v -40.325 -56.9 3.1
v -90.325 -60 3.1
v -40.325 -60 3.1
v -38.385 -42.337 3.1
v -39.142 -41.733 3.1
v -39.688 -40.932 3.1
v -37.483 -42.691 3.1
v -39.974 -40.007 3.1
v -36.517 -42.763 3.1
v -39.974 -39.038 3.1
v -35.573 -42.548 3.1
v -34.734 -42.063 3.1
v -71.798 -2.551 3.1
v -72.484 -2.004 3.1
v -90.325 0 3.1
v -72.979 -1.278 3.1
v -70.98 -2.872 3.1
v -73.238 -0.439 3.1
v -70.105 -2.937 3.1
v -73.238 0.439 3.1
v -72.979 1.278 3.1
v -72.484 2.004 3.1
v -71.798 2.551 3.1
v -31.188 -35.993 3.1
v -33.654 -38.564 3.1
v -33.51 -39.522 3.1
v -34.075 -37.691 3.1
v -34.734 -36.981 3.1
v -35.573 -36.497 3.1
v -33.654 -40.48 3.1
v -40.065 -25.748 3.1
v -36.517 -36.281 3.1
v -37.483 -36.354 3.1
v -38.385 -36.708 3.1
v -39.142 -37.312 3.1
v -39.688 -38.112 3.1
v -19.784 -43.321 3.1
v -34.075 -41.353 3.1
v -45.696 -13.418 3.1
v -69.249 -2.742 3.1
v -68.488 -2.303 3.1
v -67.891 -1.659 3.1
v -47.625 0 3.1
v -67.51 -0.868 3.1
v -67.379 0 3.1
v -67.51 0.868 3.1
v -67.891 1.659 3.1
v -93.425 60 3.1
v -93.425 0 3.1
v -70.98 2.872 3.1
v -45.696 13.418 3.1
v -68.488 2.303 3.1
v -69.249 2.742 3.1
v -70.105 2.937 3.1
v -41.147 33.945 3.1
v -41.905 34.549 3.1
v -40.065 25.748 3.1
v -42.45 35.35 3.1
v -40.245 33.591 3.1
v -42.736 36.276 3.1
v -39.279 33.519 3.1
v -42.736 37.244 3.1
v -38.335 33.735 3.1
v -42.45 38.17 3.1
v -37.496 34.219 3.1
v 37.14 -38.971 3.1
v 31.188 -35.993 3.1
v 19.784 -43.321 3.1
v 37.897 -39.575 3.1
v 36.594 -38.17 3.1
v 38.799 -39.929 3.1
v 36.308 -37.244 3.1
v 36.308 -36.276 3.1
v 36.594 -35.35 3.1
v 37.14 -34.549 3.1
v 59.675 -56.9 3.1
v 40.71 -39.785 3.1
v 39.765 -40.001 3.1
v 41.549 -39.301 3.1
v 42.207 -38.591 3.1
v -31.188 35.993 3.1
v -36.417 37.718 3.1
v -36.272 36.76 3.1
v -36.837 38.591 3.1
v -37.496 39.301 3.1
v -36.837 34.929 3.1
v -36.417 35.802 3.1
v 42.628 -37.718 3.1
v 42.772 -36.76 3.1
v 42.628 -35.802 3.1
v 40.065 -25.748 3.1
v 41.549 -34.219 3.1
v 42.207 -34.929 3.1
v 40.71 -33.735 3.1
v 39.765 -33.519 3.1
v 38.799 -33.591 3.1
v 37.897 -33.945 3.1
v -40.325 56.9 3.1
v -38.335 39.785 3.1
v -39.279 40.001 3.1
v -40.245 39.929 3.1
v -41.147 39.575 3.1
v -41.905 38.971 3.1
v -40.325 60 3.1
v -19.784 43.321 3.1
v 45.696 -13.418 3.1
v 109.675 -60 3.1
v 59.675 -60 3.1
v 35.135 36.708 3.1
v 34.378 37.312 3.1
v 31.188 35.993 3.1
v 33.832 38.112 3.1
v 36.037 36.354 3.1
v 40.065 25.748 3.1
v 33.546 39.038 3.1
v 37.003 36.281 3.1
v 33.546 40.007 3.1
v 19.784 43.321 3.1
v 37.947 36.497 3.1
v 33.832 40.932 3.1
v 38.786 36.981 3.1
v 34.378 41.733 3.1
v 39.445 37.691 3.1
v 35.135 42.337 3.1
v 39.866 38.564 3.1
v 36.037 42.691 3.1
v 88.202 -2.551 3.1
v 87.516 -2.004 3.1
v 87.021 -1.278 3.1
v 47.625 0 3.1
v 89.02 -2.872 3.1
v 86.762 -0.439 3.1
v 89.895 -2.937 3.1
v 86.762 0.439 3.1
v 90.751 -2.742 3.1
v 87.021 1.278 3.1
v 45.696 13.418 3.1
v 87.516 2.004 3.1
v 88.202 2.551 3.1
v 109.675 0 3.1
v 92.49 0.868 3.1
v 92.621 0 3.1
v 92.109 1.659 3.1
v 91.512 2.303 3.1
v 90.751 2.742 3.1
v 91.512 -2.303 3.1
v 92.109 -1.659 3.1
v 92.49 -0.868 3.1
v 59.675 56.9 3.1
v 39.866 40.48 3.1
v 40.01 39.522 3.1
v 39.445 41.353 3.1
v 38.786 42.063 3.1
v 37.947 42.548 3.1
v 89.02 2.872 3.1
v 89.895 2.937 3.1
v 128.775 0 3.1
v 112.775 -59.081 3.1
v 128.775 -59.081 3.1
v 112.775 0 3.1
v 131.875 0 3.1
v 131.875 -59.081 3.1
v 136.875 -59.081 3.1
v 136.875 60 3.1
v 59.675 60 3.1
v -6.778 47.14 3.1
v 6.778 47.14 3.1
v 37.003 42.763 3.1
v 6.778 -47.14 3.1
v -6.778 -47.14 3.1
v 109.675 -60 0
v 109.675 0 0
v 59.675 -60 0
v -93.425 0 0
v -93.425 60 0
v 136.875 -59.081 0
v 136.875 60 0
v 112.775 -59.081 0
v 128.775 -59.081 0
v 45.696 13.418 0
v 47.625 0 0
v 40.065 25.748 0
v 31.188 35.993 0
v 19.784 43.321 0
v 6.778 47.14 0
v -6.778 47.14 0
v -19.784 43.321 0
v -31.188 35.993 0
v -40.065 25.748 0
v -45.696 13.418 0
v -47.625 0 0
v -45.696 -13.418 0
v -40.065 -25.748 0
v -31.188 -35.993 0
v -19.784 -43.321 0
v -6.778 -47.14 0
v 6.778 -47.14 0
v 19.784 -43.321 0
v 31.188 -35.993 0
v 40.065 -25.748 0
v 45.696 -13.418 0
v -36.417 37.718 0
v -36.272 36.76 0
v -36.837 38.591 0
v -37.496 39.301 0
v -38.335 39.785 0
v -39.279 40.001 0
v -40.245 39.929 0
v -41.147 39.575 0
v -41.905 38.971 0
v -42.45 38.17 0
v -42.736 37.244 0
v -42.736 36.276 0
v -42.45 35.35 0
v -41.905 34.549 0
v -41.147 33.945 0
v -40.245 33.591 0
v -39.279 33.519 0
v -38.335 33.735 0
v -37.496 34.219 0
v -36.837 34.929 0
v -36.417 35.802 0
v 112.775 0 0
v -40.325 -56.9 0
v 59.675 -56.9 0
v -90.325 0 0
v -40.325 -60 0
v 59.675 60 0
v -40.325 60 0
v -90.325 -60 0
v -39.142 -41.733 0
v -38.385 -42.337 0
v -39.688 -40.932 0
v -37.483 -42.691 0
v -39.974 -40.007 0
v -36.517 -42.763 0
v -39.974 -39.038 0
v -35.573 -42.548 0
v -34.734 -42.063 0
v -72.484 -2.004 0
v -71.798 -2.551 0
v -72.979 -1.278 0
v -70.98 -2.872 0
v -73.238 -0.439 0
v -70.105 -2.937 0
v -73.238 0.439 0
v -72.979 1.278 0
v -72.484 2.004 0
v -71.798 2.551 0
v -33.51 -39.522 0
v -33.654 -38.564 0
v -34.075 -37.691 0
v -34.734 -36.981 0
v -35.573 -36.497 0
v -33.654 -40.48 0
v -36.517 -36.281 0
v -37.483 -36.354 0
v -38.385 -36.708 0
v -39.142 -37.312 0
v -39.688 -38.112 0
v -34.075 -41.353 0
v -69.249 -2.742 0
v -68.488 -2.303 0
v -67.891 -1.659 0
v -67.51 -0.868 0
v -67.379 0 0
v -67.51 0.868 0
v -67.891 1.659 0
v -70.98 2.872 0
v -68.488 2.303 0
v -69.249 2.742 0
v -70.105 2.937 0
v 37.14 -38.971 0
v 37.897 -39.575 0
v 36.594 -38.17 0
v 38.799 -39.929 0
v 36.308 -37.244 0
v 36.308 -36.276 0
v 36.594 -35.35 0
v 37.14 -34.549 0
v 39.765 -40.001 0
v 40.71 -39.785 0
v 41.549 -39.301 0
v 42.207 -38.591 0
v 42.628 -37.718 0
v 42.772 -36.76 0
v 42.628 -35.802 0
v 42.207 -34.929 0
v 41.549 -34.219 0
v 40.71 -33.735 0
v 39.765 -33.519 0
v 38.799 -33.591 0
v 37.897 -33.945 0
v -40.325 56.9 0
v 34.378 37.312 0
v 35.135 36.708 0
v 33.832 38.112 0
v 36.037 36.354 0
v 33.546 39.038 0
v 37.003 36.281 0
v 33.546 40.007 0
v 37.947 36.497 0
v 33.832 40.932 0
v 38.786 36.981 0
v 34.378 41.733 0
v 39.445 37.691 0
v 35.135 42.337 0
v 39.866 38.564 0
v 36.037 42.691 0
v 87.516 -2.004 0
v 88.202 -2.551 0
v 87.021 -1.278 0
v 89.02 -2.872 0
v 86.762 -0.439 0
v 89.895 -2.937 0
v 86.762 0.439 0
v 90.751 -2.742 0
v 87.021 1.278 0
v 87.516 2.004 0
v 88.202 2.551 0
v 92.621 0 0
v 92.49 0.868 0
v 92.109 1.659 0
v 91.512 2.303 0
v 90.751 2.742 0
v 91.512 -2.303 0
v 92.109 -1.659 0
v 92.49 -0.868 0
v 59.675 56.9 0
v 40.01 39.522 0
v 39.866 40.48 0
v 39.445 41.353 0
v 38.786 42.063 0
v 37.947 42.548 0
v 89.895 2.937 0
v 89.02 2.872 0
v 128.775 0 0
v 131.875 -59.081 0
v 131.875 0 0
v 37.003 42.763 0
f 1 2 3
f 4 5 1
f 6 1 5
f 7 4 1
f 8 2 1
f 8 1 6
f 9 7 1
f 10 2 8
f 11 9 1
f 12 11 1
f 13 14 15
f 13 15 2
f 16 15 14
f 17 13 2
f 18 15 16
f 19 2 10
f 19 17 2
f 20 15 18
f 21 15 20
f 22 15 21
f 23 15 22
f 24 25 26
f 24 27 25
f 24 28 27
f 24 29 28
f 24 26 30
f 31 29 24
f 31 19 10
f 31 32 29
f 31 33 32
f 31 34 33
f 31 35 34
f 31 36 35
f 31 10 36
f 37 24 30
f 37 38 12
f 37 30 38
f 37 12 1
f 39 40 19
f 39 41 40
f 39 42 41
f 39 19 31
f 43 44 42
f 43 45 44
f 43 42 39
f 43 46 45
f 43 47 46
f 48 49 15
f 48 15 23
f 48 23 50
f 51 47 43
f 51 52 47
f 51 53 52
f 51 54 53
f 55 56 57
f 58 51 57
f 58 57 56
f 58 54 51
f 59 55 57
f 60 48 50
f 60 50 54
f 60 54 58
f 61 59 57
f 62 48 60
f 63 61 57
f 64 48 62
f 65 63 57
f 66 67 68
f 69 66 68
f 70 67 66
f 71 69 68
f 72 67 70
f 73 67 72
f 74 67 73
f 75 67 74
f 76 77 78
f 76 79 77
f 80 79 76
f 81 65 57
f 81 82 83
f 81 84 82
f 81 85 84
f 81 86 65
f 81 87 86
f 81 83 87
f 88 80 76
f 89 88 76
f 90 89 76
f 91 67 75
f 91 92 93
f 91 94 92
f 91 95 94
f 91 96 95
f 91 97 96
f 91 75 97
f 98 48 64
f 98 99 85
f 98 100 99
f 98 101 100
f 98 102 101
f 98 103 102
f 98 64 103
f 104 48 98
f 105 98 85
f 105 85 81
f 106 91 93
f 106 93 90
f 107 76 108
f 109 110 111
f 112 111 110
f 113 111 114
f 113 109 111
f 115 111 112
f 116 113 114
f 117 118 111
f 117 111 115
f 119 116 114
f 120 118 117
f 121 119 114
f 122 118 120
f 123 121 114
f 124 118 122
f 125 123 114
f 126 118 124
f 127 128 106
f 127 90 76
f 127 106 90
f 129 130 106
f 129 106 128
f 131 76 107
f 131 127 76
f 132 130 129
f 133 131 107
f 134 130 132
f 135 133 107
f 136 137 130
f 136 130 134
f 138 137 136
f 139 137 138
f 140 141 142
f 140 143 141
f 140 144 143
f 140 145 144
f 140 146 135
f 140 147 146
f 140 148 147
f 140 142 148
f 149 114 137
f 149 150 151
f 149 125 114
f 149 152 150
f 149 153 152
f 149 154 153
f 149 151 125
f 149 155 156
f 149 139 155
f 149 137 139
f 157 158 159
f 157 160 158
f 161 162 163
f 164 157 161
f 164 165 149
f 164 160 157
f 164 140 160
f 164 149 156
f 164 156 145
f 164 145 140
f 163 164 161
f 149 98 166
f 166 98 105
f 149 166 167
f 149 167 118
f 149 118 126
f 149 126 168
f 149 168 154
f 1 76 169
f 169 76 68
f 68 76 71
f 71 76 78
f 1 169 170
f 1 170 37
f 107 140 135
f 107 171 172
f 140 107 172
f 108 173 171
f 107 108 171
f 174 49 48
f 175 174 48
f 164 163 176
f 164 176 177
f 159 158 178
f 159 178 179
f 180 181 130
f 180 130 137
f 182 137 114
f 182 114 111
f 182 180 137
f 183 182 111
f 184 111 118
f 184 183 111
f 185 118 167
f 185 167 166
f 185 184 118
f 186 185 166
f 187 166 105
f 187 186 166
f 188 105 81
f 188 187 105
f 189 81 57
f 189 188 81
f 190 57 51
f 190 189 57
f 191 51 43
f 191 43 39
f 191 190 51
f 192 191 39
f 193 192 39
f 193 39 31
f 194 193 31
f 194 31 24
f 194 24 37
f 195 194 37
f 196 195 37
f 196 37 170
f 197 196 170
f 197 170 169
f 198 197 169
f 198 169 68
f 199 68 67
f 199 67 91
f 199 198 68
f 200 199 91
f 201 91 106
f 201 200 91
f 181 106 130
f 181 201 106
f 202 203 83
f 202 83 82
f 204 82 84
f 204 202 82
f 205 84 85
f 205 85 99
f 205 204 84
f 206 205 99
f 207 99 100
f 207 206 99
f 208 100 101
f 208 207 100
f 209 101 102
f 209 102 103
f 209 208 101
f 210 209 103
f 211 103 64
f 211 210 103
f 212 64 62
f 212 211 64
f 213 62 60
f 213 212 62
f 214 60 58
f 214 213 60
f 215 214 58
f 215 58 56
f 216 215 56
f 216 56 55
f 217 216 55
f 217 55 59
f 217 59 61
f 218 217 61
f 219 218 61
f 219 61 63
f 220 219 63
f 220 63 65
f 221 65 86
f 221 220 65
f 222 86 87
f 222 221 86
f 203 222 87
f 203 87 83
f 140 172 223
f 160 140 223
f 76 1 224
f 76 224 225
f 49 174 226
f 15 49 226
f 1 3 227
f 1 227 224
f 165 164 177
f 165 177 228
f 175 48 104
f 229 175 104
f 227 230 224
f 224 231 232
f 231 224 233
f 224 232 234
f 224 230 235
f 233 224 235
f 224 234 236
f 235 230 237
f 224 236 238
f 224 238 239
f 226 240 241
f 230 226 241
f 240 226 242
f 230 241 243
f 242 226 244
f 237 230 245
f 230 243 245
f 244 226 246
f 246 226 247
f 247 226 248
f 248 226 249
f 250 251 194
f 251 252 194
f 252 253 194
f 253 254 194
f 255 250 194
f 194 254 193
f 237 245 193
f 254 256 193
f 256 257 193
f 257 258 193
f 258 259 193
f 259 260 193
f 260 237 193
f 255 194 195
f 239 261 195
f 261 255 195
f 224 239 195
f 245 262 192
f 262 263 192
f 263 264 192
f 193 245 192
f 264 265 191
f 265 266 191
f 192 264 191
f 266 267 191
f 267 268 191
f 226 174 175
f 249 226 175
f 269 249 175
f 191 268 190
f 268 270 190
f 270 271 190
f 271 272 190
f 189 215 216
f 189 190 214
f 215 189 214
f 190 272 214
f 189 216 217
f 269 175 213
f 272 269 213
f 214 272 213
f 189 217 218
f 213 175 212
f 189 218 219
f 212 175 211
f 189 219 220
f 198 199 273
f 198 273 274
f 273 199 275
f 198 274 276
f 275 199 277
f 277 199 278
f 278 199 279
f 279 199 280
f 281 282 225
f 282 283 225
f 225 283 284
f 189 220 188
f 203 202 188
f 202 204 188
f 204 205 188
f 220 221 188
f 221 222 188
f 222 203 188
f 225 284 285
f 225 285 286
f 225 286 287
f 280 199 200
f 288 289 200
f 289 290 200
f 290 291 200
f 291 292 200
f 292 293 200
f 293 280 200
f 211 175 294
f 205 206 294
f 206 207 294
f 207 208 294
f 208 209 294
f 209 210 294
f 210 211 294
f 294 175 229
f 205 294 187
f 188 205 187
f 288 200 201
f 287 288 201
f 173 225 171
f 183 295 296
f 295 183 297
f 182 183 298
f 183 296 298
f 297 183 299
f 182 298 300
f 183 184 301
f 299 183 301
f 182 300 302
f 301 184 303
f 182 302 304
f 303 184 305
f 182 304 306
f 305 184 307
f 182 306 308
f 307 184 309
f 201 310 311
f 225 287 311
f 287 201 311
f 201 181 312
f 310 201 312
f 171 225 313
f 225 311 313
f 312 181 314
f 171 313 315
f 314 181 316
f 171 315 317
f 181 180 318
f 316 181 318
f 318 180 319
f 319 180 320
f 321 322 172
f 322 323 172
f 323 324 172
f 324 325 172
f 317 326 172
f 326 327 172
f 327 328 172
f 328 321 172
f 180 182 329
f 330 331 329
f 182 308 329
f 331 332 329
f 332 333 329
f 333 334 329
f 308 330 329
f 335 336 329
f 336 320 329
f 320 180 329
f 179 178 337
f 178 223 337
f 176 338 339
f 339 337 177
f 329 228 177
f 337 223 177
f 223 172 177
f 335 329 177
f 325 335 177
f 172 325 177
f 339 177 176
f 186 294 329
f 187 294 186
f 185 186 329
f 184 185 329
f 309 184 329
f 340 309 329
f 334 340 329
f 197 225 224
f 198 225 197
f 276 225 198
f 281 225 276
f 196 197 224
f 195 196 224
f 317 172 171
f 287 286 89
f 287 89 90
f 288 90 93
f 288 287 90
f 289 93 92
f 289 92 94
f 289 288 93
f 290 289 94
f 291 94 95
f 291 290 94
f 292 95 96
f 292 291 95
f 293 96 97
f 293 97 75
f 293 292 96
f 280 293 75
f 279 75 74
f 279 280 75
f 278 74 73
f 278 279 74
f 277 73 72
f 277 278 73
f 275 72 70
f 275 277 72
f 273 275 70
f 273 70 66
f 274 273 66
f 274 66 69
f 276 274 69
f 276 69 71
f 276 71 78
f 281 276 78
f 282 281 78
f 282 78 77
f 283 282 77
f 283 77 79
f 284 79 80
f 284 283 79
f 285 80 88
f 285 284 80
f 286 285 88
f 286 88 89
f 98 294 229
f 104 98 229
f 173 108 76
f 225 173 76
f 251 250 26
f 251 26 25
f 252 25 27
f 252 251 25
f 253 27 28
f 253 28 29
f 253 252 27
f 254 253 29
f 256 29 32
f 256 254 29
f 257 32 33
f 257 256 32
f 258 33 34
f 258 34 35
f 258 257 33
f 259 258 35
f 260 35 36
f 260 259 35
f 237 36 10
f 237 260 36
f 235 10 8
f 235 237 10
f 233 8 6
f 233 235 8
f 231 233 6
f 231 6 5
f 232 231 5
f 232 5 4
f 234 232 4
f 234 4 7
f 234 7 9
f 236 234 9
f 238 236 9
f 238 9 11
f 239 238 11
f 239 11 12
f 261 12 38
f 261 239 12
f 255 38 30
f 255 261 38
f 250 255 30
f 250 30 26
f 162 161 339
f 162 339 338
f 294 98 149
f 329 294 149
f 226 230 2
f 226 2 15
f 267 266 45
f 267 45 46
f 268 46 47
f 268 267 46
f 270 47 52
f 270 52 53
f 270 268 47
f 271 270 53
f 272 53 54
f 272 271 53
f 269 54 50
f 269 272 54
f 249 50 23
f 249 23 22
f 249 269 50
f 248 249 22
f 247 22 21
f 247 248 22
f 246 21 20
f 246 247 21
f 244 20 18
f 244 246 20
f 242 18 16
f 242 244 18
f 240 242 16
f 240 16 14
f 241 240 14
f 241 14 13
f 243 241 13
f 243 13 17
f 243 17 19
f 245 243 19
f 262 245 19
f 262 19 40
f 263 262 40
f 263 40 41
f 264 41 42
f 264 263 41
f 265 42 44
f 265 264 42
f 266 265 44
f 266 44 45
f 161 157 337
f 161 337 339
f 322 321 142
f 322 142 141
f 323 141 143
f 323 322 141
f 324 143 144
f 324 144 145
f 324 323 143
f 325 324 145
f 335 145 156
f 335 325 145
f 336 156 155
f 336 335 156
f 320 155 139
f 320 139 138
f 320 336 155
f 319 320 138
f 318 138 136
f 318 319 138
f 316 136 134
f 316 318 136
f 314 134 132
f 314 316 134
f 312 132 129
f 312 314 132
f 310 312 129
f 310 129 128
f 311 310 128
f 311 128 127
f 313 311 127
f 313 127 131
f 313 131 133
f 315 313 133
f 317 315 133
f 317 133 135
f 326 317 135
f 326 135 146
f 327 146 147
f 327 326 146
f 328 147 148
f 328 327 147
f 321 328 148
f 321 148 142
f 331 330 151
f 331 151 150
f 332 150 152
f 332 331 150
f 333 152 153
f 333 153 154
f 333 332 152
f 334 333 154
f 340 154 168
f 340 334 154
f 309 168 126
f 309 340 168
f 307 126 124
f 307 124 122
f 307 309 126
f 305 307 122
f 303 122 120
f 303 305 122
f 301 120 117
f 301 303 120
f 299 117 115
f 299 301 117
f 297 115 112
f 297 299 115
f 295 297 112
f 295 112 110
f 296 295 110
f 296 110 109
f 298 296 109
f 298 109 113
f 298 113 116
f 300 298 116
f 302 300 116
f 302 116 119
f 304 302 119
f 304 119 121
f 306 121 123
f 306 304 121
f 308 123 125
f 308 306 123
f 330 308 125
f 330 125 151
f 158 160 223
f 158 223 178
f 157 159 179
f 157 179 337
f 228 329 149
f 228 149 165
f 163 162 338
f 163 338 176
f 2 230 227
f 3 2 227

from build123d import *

# Parameters (mm, degrees)
SKETCH1_W           = 200
SKETCH1_H           = 120
SKETCH1_R           = 3.25
SKETCH1_R_2         = 47.625
SKETCH1_R_3         = 2.945643703
BOSS_EXTRUDE1_DEPTH = 3.1
SKETCH2_W           = 3.1
SKETCH2_H           = 60
BOSS_EXTRUDE2_DEPTH = 3.1
SKETCH3_W           = 100
SKETCH3_H           = 3.1
CUT_EXTRUDE1_DEPTH  = 4.1
BOSS_EXTRUDE3_DEPTH = 3.1


with BuildPart() as part:
    # Sketch1 → Boss-Extrude1 (new body)
    with BuildSketch(Plane.XY):
        with Locations((9.675, 0)):
            Rectangle(SKETCH1_W, SKETCH1_H)
        with Locations((-39.522196789, 36.759986207)):
            Circle(SKETCH1_R, mode=Mode.SUBTRACT)
        with Locations((36.759986207, 39.522196789)):
            Circle(SKETCH1_R, mode=Mode.SUBTRACT)
        with Locations((39.522196789, -36.759986207)):
            Circle(SKETCH1_R, mode=Mode.SUBTRACT)
        with Locations((-36.759986207, -39.522196789)):
            Circle(SKETCH1_R, mode=Mode.SUBTRACT)
        Circle(SKETCH1_R_2, mode=Mode.SUBTRACT)
        with Locations((-70.325, 0)):
            Circle(SKETCH1_R_3, mode=Mode.SUBTRACT)
        with Locations((89.675, 0)):
            Circle(SKETCH1_R_3, mode=Mode.SUBTRACT)
    extrude(amount=BOSS_EXTRUDE1_DEPTH)

    # Sketch2 → Boss-Extrude2 (add, through all)
    with BuildSketch(Plane.XY.offset(3.1)):
        with Locations((-91.875, 30)):
            Rectangle(SKETCH2_W, SKETCH2_H)
        with Locations((111.225, 30)):
            Rectangle(SKETCH2_W, SKETCH2_H)
    extrude(amount=-BOSS_EXTRUDE2_DEPTH)

    # Sketch3 → Cut-Extrude1 (cut, through all)
    with BuildSketch(Plane.XY.offset(3.1)):
        with Locations((9.675, -58.45)):
            Rectangle(SKETCH3_W, SKETCH3_H)
        with Locations((9.675, 58.45)):
            Rectangle(SKETCH3_W, SKETCH3_H)
    extrude(amount=-CUT_EXTRUDE1_DEPTH, mode=Mode.SUBTRACT)

    # Sketch4 → Boss-Extrude3 (add, through all)
    with BuildSketch(Plane.XY.offset(3.1)):
        Polygon((112.775, 0), (112.775, -59.080724095), (128.775, -59.080724095), (128.775, 0), (131.875, 0), (131.875, -59.080724095), (136.875, -59.080724095), (136.875, 60), (112.775, 60), align=None)
    extrude(amount=-BOSS_EXTRUDE3_DEPTH)


solid = part.part
